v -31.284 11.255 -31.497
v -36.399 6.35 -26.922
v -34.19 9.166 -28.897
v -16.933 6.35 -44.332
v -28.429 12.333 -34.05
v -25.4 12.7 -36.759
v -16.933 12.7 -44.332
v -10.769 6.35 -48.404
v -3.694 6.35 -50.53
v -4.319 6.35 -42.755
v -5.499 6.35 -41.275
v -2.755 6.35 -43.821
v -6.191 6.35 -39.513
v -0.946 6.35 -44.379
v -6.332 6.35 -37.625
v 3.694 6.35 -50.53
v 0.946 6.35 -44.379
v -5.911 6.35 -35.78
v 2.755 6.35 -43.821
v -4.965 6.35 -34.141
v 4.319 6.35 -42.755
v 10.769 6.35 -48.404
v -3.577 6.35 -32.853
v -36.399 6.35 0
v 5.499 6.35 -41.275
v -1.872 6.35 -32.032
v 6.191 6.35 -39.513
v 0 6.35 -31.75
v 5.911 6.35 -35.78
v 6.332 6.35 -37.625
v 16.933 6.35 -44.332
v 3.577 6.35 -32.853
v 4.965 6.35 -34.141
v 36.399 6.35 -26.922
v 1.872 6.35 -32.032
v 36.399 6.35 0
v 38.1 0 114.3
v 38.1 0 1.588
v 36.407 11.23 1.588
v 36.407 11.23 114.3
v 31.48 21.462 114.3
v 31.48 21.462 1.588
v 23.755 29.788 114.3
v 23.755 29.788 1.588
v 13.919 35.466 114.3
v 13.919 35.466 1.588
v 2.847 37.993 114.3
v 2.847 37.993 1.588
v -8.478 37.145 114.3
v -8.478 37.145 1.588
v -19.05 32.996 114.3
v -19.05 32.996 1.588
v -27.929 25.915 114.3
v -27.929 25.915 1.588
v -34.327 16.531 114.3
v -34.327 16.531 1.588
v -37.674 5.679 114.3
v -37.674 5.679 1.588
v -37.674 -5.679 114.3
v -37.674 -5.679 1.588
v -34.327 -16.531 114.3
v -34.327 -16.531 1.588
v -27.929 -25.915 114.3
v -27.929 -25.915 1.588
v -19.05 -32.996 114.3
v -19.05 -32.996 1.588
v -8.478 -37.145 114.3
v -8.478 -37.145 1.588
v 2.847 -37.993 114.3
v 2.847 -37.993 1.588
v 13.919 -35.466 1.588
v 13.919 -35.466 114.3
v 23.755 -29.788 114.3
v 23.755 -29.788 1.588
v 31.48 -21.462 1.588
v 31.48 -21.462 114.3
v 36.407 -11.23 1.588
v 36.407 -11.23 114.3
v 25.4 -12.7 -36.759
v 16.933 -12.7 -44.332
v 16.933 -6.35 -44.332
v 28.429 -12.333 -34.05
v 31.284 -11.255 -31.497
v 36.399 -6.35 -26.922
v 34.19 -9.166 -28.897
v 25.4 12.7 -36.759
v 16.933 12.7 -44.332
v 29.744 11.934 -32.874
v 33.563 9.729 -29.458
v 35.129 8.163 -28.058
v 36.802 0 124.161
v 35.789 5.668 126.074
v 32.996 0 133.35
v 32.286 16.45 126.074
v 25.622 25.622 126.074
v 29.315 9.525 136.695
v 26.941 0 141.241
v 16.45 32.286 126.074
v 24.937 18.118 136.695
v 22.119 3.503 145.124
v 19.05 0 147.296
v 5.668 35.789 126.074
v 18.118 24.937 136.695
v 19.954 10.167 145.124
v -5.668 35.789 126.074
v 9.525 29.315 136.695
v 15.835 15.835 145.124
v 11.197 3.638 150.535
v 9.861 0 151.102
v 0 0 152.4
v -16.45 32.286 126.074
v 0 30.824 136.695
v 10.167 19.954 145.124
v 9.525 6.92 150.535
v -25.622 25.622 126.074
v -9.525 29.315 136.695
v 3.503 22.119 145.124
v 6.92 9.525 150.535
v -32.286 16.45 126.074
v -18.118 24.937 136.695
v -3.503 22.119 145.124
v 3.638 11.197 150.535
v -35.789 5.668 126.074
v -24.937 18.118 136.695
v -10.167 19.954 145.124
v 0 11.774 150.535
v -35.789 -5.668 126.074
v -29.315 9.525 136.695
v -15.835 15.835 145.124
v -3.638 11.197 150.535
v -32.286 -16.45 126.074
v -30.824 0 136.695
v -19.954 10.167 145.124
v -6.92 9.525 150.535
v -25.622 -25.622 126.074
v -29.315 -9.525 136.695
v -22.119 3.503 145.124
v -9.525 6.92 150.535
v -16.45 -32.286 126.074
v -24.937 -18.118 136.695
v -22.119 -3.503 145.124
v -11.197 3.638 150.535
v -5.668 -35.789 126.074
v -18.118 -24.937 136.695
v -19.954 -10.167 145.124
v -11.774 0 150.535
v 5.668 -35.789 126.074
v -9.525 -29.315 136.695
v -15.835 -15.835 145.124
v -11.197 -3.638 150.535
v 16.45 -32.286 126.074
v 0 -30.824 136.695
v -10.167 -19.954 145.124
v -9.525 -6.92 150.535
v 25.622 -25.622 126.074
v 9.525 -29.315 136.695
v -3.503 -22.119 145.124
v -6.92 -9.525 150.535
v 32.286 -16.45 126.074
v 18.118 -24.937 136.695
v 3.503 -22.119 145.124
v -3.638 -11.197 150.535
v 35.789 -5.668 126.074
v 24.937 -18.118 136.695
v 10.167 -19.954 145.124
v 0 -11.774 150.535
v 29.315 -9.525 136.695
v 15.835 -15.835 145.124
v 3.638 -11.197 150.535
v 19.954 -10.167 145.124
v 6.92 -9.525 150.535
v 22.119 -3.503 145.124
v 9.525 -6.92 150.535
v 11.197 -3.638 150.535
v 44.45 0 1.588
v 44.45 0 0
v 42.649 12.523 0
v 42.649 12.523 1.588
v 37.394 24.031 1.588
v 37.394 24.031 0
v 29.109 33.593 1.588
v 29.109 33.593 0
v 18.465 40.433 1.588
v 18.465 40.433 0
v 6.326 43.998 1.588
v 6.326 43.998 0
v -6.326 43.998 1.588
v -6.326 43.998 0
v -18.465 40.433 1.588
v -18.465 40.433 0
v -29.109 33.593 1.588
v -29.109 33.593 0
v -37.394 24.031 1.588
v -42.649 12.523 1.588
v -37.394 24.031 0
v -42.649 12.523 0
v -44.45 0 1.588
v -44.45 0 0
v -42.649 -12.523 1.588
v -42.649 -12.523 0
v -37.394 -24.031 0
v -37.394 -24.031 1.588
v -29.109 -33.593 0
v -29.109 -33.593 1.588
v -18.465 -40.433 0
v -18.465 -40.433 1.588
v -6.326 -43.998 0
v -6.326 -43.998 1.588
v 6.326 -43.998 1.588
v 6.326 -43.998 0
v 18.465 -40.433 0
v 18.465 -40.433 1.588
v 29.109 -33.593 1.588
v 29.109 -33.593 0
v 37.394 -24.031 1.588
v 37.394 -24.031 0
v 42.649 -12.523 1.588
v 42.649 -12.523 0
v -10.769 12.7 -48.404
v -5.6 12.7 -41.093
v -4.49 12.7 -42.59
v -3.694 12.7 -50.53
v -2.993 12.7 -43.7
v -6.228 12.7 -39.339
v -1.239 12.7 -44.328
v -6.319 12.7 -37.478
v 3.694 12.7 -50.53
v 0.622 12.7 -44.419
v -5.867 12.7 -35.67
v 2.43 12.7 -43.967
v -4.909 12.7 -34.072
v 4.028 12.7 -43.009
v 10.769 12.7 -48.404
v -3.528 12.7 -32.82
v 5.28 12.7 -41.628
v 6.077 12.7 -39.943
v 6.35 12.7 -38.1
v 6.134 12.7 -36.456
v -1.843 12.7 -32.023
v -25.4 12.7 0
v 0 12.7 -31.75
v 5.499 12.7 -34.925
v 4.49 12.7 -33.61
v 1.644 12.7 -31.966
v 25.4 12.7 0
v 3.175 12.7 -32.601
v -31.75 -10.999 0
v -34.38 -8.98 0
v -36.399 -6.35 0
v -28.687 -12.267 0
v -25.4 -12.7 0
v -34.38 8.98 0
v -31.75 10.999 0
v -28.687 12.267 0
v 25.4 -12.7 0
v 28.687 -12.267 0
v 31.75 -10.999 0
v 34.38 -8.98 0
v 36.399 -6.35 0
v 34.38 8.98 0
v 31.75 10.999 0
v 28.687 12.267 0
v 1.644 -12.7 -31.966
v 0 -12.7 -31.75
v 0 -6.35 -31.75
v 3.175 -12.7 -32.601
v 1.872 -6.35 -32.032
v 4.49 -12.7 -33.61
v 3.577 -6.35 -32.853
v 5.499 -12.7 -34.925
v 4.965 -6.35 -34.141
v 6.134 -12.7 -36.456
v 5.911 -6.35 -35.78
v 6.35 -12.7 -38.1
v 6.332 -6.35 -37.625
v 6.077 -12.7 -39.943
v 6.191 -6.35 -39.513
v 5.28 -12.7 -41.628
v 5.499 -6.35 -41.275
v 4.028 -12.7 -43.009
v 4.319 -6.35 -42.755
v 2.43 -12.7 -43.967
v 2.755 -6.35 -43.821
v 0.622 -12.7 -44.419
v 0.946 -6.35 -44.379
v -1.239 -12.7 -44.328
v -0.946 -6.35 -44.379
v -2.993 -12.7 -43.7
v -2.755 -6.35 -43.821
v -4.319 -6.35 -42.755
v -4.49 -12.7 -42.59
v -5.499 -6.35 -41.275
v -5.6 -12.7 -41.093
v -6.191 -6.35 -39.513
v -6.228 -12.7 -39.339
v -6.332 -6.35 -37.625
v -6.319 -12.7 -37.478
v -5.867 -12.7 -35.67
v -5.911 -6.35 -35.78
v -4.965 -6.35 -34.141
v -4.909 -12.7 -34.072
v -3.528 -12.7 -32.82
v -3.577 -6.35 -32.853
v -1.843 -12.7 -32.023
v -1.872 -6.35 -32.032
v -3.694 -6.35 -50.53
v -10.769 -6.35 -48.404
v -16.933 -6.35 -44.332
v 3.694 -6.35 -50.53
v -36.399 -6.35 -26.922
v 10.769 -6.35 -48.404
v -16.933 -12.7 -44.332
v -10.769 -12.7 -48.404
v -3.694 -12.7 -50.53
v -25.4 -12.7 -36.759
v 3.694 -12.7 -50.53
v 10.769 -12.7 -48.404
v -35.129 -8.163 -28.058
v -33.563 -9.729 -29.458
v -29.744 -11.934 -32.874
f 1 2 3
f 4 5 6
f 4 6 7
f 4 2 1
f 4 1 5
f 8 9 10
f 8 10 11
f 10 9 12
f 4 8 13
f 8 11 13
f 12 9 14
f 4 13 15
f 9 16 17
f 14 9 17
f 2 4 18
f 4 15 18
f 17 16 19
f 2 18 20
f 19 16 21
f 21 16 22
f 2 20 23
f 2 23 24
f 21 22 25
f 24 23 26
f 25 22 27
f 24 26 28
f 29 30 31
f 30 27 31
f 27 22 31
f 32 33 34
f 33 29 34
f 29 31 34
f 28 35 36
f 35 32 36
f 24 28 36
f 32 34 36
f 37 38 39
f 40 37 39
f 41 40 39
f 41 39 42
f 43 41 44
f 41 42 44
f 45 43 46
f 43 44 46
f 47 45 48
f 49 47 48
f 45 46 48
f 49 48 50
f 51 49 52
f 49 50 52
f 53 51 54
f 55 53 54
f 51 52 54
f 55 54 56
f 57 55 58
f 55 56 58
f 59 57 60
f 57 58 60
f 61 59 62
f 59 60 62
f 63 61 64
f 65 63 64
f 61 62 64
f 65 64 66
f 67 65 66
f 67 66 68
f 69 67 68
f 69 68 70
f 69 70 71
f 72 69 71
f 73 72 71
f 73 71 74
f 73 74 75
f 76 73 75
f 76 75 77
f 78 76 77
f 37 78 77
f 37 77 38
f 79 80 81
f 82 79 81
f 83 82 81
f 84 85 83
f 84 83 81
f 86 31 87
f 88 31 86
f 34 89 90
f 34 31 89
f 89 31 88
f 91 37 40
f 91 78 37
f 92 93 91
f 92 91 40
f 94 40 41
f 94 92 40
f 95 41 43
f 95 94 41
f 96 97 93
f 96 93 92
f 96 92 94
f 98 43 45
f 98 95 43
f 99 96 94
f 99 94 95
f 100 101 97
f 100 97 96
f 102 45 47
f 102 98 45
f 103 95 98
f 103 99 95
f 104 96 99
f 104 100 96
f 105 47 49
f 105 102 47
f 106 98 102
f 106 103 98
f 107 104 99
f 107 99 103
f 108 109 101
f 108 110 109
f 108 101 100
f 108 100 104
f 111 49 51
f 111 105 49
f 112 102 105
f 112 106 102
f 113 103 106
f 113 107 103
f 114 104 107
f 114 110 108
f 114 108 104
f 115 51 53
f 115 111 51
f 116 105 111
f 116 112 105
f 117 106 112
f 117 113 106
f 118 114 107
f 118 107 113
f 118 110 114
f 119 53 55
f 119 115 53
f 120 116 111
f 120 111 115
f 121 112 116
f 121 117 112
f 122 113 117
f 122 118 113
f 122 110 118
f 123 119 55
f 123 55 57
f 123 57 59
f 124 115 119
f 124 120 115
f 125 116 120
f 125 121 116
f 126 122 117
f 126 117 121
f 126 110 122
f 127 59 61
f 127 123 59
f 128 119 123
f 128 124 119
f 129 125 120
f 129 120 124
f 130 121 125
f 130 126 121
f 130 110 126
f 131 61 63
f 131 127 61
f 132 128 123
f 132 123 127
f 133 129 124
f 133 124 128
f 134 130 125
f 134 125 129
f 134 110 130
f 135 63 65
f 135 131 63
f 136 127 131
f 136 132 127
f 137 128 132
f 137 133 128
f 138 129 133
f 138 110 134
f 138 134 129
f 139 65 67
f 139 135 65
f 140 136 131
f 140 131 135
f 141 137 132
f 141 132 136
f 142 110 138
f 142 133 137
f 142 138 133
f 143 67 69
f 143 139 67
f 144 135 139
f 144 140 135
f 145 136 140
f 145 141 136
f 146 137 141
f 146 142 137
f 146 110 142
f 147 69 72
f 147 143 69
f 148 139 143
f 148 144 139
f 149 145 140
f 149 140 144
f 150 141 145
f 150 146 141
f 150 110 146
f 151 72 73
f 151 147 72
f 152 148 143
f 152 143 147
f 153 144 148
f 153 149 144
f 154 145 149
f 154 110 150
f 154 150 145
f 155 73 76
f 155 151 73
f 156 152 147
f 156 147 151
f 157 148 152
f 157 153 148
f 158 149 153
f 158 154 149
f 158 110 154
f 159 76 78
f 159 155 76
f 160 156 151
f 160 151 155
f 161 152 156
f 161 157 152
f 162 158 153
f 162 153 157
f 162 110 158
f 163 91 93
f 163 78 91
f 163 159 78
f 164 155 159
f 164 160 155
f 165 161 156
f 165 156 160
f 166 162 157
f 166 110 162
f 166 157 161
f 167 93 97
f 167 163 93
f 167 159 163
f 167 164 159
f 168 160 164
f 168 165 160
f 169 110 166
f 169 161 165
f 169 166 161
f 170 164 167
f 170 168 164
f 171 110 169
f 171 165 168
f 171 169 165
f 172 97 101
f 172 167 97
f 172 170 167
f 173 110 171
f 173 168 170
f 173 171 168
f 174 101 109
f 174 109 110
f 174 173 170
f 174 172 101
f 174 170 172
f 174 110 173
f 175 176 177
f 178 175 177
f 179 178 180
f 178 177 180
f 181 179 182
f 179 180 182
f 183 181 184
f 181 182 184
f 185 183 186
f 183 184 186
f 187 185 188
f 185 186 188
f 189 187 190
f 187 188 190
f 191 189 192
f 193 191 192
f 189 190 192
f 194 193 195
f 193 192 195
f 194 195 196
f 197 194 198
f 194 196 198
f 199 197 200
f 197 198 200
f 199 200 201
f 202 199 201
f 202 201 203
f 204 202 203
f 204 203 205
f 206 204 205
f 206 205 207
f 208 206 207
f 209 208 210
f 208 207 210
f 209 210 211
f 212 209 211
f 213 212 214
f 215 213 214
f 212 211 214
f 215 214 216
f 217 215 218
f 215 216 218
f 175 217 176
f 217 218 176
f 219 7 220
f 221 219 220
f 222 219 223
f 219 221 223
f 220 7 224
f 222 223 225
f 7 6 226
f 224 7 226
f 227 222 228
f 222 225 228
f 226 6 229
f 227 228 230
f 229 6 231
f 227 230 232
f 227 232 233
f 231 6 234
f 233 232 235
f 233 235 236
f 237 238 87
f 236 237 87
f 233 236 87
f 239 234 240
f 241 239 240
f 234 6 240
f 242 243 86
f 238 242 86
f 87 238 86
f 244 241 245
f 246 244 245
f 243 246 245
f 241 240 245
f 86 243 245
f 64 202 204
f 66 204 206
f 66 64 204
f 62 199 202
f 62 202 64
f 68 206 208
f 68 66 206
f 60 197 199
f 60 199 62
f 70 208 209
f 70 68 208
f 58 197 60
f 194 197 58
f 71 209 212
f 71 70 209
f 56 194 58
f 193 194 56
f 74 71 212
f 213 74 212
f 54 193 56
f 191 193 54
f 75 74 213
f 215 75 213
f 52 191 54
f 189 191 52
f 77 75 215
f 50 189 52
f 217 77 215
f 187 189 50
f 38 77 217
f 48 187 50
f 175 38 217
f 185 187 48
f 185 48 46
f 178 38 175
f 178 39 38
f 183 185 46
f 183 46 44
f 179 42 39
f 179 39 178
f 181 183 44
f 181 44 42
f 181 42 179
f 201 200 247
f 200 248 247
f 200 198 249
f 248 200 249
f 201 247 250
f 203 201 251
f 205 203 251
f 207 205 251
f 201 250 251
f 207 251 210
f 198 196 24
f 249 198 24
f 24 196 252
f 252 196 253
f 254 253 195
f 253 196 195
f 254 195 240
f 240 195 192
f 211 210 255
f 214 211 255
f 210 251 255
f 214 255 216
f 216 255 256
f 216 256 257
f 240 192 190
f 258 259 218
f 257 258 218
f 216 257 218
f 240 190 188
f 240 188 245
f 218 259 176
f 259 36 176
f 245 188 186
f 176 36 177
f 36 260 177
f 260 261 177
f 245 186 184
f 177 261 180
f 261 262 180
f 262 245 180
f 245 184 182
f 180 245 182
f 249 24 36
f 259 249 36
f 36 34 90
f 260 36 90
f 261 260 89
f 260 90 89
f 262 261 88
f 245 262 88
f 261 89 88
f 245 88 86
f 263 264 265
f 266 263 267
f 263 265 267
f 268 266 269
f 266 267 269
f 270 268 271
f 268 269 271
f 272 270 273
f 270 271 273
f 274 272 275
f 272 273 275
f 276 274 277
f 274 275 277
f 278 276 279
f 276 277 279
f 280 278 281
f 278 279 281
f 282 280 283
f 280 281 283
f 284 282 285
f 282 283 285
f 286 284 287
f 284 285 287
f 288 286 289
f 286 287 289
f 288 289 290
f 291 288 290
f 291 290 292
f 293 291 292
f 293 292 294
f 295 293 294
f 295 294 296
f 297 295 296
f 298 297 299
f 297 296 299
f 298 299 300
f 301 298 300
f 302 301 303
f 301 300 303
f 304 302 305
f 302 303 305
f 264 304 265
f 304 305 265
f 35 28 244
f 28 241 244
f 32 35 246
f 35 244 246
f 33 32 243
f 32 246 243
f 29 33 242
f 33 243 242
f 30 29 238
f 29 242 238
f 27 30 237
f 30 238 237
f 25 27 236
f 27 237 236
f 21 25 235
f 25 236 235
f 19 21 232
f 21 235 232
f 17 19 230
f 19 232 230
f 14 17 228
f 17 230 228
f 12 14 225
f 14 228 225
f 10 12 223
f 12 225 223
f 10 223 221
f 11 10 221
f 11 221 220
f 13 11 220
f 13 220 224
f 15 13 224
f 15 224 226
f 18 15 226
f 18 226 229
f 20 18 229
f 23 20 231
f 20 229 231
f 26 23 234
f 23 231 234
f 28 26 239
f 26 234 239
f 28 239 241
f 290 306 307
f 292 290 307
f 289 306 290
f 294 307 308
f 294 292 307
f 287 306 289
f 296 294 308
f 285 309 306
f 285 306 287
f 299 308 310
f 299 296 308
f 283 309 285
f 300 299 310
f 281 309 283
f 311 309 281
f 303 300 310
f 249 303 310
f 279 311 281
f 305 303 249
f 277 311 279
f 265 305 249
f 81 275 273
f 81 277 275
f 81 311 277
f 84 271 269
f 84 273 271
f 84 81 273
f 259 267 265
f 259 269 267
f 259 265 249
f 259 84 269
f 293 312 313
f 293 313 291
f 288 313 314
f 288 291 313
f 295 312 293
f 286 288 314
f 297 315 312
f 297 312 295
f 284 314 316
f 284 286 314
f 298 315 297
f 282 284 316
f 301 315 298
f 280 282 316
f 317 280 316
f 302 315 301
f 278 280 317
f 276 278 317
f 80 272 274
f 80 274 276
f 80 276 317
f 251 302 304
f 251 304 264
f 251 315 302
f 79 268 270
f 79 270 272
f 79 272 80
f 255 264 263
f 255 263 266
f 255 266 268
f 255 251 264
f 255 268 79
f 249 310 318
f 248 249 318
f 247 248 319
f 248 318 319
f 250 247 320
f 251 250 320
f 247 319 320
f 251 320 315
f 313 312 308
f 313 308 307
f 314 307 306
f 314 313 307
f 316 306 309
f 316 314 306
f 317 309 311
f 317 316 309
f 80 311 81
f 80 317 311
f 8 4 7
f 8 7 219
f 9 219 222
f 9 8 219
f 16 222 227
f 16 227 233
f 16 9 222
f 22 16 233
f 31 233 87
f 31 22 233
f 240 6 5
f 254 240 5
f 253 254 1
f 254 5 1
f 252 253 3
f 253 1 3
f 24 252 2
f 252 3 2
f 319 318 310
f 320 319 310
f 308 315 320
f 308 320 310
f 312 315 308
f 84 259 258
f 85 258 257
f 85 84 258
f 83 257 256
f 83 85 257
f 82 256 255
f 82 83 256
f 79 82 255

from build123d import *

# Parameters (mm, degrees)
F0_R        = 38.1
F1_DEPTH    = 152.4
F2_R        = 38.1
F4_DEPTH    = 12.7
F5_T1_DEPTH = 57.15
F6_W        = 12.7
F6_H        = 50.8
F7_DEPTH    = 38.1
F0_R_2      = 44.45
F8_DEPTH    = 1.5875


# Not quite as in the source:
# - a fillet or chamfer that OpenCascade refuses, or shapes differently, is made with other operations: its cross-section is extruded or revolved along the edge and cut away or added


with BuildPart() as f1:
    # F0 (on Top) → F1 (new body)
    with BuildSketch(Plane.XY):
        Circle(F0_R)
    extrude(amount=F1_DEPTH)

    # F2
    f2_edges = [f1.edges().sort_by_distance(p)[0] for p in [
        (-38.1, 0, 152.4),
    ]]
    fillet(f2_edges, radius=F2_R)

    # F3 (on Front) → F4 (join, symmetric)
    with BuildSketch(Plane.XZ):
        with BuildLine():
            Line((16.9333333333, -44.3320422095), (38.1, -25.4))
            Line((38.1, -25.4), (38.1, 0))
            Line((38.1, 0), (0, 0))
            Line((0, 0), (-38.1, 0))
            Line((-38.1, 0), (-38.1, -25.4))
            Line((-38.1, -25.4), (-16.9333333333, -44.3320422095))
            ThreePointArc((-16.9333333333, -44.3320422095), (0, -50.8), (16.9333333333, -44.3320422095))
        make_face()
        with BuildLine():
            ThreePointArc((6.35, -38.1), (-4.4901280605, -42.5901280605), (0, -31.75))
            ThreePointArc((0, -31.75), (4.4901280605, -33.6098719395), (6.35, -38.1))
        make_face(mode=Mode.SUBTRACT)
    extrude(amount=F4_DEPTH, both=True)

    # F5: fillet of radius 12.7 on 4 edges, made by hand

    # F5_s2 → F5_t1 (cut)
    with BuildSketch(Plane.XY.offset(-57.15)):
        with BuildLine():
            ThreePointArc((38.1, 0), (34.3802561211, -8.9802561211), (25.4, -12.7))
            Line((25.4, -12.7), (38.1, -12.7))
            Line((38.1, -12.7), (38.1, 0))
        make_face()
        with BuildLine():
            ThreePointArc((38.1, 0), (34.3802561211, 8.9802561211), (25.4, 12.7))
            Line((25.4, 12.7), (38.1, 12.7))
            Line((38.1, 12.7), (38.1, 0))
        make_face()
        with BuildLine():
            ThreePointArc((-25.4, 12.7), (-34.3802561211, 8.9802561211), (-38.1, 0))
            Line((-38.1, 0), (-38.1, 12.7))
            Line((-38.1, 12.7), (-25.4, 12.7))
        make_face()
        with BuildLine():
            ThreePointArc((-38.1, 0), (-34.3802561211, -8.9802561211), (-25.4, -12.7))
            Line((-25.4, -12.7), (-38.1, -12.7))
            Line((-38.1, -12.7), (-38.1, 0))
        make_face()
    extrude(amount=F5_T1_DEPTH, mode=Mode.SUBTRACT)

    # F6 (on Right) → F7 (cut, symmetric)
    with BuildSketch(Plane.YZ):
        with Locations((0, -25.4)):
            Rectangle(F6_W, F6_H)
    extrude(amount=F7_DEPTH, both=True, mode=Mode.SUBTRACT)

    # F0 (on Top) → F8 (join)
    with BuildSketch(Plane.XY):
        Circle(F0_R_2)
        Circle(F0_R, mode=Mode.SUBTRACT)
    extrude(amount=F8_DEPTH)


solid = f1.part
